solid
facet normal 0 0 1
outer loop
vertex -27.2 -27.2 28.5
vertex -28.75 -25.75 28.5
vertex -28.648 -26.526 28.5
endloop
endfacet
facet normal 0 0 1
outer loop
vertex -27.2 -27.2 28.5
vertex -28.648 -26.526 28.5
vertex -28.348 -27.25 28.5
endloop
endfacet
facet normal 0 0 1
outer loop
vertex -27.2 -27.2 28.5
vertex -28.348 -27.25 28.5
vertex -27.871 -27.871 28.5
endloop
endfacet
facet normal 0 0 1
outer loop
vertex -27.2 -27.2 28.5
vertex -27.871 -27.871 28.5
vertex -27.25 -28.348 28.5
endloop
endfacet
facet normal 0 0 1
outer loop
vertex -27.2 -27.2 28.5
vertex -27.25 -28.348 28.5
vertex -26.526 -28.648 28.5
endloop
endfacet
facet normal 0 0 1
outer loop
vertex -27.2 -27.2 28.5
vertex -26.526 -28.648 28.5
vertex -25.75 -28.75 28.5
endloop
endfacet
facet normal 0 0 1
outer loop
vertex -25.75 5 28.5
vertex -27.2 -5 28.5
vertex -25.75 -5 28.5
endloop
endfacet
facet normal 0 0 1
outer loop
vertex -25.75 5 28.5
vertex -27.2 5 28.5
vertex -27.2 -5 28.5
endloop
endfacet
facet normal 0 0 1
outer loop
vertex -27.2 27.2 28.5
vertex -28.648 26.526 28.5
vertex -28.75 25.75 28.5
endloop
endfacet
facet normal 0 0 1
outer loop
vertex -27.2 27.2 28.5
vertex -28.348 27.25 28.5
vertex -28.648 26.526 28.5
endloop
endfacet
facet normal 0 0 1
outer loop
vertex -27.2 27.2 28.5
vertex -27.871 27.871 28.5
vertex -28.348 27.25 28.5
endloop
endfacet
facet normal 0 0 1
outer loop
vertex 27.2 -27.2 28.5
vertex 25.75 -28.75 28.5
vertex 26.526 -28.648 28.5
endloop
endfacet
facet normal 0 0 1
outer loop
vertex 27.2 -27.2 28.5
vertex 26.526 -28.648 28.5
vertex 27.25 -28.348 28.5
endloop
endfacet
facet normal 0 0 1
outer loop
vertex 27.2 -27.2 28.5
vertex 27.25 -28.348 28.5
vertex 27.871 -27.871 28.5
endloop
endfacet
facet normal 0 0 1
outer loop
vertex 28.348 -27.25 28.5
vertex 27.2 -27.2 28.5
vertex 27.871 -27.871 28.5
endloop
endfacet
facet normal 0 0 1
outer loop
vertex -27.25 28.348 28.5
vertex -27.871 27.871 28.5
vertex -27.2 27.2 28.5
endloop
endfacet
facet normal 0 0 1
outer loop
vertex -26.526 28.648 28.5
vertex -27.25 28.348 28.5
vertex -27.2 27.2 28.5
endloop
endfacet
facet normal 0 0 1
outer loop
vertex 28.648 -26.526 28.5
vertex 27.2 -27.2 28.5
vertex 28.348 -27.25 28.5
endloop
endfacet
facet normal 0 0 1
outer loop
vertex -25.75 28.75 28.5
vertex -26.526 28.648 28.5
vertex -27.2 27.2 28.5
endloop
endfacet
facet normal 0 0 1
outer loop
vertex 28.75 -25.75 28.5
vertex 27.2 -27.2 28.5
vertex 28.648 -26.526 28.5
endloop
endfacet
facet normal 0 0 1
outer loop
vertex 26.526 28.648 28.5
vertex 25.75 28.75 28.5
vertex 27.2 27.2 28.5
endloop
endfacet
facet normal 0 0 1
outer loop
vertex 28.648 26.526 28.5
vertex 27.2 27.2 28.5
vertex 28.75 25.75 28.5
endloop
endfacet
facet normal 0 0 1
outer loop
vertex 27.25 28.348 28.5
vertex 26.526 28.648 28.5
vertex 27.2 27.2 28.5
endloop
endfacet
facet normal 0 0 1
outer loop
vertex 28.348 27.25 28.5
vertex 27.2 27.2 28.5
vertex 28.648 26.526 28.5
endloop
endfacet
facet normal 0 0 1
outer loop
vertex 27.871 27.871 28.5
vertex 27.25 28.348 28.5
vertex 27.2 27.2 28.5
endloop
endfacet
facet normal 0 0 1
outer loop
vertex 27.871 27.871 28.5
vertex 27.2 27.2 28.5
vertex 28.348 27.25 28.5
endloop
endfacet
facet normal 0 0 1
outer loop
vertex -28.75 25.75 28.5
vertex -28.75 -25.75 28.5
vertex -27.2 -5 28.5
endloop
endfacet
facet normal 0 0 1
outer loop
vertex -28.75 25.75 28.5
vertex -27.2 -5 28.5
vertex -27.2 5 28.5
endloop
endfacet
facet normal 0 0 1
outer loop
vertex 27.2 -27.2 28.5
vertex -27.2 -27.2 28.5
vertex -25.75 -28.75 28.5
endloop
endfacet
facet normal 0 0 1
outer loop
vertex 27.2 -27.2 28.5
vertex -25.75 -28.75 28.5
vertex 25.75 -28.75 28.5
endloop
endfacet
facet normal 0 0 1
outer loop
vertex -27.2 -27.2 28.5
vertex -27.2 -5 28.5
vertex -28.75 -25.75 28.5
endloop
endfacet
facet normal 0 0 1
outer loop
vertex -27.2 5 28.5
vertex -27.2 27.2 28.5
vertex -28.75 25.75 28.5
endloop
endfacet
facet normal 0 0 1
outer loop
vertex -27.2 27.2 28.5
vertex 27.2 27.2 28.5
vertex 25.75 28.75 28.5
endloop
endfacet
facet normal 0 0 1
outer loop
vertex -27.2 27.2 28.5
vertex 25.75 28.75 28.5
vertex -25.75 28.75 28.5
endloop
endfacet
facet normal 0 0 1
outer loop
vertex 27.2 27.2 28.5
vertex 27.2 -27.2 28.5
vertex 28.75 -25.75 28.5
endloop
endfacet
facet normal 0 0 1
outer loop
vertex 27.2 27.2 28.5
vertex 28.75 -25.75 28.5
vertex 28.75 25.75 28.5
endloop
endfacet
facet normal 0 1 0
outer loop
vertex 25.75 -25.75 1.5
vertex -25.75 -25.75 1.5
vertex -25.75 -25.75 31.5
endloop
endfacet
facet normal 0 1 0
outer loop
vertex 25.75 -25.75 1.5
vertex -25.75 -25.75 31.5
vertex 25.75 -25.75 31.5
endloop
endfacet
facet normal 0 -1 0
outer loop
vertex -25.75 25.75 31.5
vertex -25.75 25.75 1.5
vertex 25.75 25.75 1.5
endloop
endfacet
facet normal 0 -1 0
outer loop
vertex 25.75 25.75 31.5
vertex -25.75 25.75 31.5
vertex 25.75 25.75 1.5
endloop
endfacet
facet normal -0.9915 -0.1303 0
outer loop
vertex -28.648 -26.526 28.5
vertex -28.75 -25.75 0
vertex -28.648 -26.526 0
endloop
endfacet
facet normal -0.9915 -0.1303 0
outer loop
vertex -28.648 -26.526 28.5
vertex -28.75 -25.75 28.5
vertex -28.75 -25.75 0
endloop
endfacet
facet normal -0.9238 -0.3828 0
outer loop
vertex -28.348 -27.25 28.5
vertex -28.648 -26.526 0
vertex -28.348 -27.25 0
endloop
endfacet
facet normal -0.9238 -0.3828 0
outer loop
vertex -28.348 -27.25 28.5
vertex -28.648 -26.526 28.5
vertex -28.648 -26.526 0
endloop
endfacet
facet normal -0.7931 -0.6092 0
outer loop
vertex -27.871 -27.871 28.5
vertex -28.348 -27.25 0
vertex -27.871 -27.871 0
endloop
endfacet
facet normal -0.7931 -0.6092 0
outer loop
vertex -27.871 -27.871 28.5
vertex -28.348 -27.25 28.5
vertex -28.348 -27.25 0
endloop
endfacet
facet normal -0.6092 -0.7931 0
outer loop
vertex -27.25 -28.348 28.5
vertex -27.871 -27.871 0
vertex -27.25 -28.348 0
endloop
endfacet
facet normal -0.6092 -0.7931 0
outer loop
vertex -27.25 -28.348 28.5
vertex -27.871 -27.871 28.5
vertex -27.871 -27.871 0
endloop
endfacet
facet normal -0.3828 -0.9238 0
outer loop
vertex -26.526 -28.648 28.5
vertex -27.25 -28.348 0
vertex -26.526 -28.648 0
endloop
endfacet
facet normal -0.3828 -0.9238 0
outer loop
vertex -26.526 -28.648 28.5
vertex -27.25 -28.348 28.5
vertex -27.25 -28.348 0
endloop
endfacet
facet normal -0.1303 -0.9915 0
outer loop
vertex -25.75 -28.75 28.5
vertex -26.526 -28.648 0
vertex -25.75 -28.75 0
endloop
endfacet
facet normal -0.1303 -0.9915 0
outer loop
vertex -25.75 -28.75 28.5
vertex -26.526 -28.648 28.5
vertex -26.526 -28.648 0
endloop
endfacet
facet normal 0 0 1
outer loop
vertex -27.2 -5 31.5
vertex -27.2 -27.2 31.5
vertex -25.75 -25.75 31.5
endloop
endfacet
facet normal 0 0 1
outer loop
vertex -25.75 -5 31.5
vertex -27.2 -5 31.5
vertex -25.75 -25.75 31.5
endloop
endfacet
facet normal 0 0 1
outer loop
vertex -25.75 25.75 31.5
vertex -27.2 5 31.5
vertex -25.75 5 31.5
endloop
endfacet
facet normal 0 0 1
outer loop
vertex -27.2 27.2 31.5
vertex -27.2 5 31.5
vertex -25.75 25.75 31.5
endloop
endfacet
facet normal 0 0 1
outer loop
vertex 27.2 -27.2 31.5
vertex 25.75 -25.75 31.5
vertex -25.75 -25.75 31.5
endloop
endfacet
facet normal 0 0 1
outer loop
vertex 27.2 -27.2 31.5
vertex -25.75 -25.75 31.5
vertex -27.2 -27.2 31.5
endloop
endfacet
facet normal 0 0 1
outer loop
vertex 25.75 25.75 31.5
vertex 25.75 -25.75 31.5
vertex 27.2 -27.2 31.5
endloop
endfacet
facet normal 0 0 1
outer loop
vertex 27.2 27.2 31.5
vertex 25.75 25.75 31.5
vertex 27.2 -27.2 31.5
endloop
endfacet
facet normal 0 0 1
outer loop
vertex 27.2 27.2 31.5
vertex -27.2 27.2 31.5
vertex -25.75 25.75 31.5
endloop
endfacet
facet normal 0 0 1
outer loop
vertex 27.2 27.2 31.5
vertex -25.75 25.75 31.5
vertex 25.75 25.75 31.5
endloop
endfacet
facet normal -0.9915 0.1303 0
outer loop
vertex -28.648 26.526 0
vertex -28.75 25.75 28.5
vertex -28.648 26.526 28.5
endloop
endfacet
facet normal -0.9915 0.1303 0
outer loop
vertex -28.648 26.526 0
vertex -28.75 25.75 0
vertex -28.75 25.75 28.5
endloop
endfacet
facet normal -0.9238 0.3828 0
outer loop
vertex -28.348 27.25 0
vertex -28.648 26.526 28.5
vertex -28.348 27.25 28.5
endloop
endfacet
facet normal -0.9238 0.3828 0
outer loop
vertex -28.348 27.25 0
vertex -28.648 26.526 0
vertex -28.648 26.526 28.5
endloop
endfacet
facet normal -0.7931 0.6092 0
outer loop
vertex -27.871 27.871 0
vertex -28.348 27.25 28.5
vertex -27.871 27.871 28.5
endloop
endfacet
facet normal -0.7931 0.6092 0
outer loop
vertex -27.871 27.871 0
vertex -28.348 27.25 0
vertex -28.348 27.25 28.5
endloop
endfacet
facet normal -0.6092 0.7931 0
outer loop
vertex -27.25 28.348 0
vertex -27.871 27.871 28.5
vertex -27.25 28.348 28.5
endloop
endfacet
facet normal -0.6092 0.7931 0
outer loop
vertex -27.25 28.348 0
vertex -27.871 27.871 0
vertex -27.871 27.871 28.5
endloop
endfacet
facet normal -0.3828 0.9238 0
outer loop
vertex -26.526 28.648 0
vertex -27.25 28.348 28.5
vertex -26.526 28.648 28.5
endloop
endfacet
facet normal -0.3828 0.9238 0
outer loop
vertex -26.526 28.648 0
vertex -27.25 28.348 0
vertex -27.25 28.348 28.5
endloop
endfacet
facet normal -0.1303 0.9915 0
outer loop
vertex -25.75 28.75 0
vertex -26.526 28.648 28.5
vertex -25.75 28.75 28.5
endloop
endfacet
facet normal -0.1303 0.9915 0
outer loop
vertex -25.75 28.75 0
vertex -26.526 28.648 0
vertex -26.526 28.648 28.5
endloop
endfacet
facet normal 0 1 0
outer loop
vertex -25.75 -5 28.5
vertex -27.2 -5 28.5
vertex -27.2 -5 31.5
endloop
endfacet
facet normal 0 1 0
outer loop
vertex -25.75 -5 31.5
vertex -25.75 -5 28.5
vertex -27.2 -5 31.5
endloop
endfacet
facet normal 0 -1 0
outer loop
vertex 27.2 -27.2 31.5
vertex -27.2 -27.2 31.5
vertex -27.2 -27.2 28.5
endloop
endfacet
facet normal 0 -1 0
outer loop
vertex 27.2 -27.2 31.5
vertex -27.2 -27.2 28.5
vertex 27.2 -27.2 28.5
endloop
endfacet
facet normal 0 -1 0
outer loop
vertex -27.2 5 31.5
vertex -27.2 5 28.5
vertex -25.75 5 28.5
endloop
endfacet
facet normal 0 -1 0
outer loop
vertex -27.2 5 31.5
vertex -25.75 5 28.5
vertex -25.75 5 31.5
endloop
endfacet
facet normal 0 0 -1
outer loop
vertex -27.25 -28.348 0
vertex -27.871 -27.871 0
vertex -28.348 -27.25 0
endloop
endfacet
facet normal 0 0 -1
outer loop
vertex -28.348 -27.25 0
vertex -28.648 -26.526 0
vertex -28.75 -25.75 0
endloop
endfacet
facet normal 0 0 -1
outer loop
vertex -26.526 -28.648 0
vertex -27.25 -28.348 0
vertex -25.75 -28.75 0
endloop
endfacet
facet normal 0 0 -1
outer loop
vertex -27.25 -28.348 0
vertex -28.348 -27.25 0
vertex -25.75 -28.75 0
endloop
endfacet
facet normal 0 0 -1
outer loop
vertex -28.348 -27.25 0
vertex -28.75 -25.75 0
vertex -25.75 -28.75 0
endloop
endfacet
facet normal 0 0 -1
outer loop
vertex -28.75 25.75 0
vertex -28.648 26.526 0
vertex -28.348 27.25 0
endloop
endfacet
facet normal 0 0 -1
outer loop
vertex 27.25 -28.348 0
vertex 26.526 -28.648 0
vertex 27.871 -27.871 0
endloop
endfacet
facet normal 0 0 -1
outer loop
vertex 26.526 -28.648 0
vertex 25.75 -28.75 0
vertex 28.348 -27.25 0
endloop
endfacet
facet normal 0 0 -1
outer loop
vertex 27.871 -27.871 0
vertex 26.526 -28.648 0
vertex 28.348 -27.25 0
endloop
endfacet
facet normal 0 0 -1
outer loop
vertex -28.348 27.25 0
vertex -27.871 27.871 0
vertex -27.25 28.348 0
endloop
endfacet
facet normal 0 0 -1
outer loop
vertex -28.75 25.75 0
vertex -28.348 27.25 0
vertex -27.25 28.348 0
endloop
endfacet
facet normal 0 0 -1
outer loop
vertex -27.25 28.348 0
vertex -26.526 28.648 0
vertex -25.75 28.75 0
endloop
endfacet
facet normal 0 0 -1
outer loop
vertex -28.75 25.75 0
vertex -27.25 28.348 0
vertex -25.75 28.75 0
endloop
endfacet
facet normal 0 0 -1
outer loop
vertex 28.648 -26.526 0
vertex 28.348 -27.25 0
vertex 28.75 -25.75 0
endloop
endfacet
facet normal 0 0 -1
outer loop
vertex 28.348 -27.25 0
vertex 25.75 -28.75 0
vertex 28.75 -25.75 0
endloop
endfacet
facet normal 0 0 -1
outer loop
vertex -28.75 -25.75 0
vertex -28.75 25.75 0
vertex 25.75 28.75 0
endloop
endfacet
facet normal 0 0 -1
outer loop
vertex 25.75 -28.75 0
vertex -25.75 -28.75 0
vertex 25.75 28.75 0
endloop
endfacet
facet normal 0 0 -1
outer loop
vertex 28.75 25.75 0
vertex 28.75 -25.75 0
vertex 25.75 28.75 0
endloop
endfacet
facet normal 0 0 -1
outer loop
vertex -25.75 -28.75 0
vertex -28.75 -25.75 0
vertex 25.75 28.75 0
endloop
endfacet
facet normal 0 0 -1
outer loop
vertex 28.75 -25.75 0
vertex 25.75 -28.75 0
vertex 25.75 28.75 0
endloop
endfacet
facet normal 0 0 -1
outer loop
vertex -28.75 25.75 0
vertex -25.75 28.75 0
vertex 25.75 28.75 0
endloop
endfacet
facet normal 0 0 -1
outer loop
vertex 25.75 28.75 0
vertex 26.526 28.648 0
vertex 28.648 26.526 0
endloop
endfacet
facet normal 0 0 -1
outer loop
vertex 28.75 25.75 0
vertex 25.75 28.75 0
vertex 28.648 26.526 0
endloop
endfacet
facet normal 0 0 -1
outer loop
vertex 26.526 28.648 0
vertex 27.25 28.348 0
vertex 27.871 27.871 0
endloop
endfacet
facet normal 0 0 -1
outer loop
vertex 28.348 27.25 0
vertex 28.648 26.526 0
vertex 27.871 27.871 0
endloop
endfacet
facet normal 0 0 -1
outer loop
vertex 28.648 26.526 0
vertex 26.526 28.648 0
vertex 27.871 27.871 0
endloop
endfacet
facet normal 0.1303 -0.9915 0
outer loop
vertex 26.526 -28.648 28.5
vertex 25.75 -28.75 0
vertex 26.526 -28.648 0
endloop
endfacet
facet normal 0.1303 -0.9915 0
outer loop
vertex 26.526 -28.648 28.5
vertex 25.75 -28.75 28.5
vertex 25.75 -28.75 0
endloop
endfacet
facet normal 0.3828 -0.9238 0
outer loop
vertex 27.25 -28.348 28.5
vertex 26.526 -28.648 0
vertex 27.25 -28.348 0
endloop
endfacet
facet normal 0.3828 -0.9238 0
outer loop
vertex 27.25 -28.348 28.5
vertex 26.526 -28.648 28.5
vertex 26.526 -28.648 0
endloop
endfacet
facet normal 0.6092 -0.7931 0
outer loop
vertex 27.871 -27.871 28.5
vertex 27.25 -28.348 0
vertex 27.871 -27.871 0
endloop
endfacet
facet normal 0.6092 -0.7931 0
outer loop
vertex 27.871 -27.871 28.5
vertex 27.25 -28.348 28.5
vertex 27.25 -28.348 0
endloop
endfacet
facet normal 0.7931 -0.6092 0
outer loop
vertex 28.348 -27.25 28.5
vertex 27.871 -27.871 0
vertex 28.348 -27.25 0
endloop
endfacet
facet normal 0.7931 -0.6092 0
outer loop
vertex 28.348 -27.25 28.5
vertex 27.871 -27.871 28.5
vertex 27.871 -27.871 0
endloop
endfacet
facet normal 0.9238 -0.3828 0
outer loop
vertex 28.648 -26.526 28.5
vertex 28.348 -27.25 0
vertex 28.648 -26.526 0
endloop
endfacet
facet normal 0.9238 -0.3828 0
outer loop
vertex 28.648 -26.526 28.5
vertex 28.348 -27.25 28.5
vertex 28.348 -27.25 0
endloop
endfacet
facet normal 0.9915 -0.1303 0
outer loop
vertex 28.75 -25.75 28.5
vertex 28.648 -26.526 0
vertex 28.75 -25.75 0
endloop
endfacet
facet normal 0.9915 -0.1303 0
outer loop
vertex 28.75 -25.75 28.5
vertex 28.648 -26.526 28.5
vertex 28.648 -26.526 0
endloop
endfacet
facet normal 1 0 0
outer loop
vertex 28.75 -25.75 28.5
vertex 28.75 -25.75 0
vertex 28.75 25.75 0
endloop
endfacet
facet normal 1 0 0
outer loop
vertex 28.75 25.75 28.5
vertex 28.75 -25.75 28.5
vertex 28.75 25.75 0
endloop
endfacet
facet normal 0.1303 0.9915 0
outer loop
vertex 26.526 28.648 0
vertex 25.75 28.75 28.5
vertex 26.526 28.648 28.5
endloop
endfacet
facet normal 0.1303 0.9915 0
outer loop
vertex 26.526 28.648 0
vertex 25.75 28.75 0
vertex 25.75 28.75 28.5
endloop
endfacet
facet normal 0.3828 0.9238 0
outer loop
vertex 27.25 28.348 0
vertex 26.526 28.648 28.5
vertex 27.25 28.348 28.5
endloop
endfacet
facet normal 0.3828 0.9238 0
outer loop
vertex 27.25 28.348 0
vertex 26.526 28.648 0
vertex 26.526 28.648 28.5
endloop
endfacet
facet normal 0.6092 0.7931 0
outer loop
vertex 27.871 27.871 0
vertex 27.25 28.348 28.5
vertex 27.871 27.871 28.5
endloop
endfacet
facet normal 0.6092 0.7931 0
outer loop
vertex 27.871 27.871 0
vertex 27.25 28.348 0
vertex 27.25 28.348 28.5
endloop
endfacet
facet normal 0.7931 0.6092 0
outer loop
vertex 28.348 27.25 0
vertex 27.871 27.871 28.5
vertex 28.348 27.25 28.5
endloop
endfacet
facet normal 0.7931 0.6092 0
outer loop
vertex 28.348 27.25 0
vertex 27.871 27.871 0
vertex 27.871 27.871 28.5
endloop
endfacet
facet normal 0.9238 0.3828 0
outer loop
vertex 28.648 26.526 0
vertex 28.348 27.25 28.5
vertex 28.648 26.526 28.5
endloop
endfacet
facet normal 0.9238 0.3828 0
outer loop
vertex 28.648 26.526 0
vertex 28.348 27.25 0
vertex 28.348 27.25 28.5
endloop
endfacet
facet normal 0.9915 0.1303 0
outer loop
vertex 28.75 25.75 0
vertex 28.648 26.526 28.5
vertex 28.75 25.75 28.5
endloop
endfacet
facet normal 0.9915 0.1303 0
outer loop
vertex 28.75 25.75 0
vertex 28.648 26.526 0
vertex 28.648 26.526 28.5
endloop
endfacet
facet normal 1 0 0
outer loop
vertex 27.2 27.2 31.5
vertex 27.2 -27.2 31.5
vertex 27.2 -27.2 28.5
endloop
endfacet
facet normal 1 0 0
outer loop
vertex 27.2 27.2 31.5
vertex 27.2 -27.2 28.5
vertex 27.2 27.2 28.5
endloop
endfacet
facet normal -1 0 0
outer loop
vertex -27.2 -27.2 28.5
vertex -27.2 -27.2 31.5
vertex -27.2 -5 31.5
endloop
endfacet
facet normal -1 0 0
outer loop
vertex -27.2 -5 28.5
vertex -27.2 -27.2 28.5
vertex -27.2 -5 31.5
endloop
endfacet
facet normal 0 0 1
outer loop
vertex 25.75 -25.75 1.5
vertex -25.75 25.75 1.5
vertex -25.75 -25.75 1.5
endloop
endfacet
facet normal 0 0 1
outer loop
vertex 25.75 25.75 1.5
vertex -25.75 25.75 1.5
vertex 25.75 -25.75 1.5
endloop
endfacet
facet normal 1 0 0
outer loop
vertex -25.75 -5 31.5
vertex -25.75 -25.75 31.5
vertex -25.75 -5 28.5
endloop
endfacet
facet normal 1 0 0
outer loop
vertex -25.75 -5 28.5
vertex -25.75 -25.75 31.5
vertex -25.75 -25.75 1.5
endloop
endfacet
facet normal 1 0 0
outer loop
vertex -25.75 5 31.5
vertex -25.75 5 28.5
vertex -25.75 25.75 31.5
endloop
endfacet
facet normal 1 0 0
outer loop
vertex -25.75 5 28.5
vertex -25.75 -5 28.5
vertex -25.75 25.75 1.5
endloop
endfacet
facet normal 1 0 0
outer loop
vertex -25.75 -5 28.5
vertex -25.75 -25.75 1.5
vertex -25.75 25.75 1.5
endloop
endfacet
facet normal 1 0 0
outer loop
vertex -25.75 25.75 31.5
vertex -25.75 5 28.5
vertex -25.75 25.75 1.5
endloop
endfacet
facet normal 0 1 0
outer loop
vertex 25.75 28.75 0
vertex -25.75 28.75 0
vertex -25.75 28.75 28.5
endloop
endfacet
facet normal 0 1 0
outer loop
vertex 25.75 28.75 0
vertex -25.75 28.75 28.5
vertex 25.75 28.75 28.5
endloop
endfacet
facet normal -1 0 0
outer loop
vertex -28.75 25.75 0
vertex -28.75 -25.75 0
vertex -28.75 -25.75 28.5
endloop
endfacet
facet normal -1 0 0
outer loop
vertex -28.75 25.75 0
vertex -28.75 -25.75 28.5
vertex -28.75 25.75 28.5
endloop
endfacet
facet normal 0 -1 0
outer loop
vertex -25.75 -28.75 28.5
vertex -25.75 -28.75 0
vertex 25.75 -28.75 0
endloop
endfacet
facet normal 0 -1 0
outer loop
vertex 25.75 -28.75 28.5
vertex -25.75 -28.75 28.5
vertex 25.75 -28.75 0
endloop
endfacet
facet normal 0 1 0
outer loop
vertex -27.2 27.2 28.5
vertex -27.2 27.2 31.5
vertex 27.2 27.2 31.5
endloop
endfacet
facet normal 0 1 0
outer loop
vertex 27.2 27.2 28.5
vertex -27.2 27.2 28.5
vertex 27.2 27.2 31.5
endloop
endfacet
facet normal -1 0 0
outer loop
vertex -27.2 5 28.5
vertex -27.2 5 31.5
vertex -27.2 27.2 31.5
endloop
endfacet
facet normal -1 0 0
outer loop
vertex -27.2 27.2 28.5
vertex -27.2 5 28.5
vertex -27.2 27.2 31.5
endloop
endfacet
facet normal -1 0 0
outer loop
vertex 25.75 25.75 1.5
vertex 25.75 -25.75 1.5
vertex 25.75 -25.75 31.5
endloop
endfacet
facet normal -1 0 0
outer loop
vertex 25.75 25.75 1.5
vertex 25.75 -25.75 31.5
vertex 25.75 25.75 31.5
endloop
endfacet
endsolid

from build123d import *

# Parameters (mm, degrees)
SKETCH_W        = 57.5
SKETCH_H        = 57.5
PAD_DEPTH       = 1.5
SKETCH001_W     = 57.5
SKETCH001_H     = 57.5
SKETCH001_W_2   = 51.5
SKETCH001_H_2   = 51.5
PAD001_DEPTH    = 30
SKETCH002_W     = 57.5
SKETCH002_H     = 57.5
SKETCH002_W_2   = 54.4
SKETCH002_H_2   = 54.4
POCKET_DEPTH    = 3
FILLET_R        = 3
SKETCH003_W     = 10
SKETCH003_H     = 3
POCKET001_DEPTH = 5


with BuildPart() as part:
    # Sketch → Pad (new body)
    with BuildSketch(Plane.XY):
        Rectangle(SKETCH_W, SKETCH_H)
    extrude(amount=PAD_DEPTH)

    # Sketch001 (on Face6 of Pad) → Pad001 (join)
    with BuildSketch(Plane.XY.offset(1.5)):
        Rectangle(SKETCH001_W, SKETCH001_H)
        Rectangle(SKETCH001_W_2, SKETCH001_H_2, mode=Mode.SUBTRACT)
    extrude(amount=PAD001_DEPTH)

    # Sketch002 (on Face9 of Pad001) → Pocket (cut)
    with BuildSketch(Plane.XY.offset(31.5)):
        Rectangle(SKETCH002_W, SKETCH002_H)
        Rectangle(SKETCH002_W_2, SKETCH002_H_2, mode=Mode.SUBTRACT)
    extrude(amount=-POCKET_DEPTH, mode=Mode.SUBTRACT)

    # Fillet
    fillet_edges = [part.edges().sort_by_distance(p)[0] for p in [
        (-28.75, 28.75, 15),
        (-28.75, 28.75, 0.75),
        (-28.75, -28.75, 0.75),
        (-28.75, -28.75, 15),
        (28.75, -28.75, 0.75),
        (28.75, -28.75, 15),
        (28.75, 28.75, 15),
        (28.75, 28.75, 0.75),
    ]]
    fillet(fillet_edges, radius=FILLET_R)

    # Sketch003 (on Face22 of Fillet) → Pocket001 (cut)
    with BuildSketch(Plane(origin=(-27.2, 0, 0), x_dir=(0, -1, 0), z_dir=(-1, 0, 0))):
        with Locations((0, 30)):
            Rectangle(SKETCH003_W, SKETCH003_H)
    extrude(amount=-POCKET001_DEPTH, mode=Mode.SUBTRACT)


solid = part.part
